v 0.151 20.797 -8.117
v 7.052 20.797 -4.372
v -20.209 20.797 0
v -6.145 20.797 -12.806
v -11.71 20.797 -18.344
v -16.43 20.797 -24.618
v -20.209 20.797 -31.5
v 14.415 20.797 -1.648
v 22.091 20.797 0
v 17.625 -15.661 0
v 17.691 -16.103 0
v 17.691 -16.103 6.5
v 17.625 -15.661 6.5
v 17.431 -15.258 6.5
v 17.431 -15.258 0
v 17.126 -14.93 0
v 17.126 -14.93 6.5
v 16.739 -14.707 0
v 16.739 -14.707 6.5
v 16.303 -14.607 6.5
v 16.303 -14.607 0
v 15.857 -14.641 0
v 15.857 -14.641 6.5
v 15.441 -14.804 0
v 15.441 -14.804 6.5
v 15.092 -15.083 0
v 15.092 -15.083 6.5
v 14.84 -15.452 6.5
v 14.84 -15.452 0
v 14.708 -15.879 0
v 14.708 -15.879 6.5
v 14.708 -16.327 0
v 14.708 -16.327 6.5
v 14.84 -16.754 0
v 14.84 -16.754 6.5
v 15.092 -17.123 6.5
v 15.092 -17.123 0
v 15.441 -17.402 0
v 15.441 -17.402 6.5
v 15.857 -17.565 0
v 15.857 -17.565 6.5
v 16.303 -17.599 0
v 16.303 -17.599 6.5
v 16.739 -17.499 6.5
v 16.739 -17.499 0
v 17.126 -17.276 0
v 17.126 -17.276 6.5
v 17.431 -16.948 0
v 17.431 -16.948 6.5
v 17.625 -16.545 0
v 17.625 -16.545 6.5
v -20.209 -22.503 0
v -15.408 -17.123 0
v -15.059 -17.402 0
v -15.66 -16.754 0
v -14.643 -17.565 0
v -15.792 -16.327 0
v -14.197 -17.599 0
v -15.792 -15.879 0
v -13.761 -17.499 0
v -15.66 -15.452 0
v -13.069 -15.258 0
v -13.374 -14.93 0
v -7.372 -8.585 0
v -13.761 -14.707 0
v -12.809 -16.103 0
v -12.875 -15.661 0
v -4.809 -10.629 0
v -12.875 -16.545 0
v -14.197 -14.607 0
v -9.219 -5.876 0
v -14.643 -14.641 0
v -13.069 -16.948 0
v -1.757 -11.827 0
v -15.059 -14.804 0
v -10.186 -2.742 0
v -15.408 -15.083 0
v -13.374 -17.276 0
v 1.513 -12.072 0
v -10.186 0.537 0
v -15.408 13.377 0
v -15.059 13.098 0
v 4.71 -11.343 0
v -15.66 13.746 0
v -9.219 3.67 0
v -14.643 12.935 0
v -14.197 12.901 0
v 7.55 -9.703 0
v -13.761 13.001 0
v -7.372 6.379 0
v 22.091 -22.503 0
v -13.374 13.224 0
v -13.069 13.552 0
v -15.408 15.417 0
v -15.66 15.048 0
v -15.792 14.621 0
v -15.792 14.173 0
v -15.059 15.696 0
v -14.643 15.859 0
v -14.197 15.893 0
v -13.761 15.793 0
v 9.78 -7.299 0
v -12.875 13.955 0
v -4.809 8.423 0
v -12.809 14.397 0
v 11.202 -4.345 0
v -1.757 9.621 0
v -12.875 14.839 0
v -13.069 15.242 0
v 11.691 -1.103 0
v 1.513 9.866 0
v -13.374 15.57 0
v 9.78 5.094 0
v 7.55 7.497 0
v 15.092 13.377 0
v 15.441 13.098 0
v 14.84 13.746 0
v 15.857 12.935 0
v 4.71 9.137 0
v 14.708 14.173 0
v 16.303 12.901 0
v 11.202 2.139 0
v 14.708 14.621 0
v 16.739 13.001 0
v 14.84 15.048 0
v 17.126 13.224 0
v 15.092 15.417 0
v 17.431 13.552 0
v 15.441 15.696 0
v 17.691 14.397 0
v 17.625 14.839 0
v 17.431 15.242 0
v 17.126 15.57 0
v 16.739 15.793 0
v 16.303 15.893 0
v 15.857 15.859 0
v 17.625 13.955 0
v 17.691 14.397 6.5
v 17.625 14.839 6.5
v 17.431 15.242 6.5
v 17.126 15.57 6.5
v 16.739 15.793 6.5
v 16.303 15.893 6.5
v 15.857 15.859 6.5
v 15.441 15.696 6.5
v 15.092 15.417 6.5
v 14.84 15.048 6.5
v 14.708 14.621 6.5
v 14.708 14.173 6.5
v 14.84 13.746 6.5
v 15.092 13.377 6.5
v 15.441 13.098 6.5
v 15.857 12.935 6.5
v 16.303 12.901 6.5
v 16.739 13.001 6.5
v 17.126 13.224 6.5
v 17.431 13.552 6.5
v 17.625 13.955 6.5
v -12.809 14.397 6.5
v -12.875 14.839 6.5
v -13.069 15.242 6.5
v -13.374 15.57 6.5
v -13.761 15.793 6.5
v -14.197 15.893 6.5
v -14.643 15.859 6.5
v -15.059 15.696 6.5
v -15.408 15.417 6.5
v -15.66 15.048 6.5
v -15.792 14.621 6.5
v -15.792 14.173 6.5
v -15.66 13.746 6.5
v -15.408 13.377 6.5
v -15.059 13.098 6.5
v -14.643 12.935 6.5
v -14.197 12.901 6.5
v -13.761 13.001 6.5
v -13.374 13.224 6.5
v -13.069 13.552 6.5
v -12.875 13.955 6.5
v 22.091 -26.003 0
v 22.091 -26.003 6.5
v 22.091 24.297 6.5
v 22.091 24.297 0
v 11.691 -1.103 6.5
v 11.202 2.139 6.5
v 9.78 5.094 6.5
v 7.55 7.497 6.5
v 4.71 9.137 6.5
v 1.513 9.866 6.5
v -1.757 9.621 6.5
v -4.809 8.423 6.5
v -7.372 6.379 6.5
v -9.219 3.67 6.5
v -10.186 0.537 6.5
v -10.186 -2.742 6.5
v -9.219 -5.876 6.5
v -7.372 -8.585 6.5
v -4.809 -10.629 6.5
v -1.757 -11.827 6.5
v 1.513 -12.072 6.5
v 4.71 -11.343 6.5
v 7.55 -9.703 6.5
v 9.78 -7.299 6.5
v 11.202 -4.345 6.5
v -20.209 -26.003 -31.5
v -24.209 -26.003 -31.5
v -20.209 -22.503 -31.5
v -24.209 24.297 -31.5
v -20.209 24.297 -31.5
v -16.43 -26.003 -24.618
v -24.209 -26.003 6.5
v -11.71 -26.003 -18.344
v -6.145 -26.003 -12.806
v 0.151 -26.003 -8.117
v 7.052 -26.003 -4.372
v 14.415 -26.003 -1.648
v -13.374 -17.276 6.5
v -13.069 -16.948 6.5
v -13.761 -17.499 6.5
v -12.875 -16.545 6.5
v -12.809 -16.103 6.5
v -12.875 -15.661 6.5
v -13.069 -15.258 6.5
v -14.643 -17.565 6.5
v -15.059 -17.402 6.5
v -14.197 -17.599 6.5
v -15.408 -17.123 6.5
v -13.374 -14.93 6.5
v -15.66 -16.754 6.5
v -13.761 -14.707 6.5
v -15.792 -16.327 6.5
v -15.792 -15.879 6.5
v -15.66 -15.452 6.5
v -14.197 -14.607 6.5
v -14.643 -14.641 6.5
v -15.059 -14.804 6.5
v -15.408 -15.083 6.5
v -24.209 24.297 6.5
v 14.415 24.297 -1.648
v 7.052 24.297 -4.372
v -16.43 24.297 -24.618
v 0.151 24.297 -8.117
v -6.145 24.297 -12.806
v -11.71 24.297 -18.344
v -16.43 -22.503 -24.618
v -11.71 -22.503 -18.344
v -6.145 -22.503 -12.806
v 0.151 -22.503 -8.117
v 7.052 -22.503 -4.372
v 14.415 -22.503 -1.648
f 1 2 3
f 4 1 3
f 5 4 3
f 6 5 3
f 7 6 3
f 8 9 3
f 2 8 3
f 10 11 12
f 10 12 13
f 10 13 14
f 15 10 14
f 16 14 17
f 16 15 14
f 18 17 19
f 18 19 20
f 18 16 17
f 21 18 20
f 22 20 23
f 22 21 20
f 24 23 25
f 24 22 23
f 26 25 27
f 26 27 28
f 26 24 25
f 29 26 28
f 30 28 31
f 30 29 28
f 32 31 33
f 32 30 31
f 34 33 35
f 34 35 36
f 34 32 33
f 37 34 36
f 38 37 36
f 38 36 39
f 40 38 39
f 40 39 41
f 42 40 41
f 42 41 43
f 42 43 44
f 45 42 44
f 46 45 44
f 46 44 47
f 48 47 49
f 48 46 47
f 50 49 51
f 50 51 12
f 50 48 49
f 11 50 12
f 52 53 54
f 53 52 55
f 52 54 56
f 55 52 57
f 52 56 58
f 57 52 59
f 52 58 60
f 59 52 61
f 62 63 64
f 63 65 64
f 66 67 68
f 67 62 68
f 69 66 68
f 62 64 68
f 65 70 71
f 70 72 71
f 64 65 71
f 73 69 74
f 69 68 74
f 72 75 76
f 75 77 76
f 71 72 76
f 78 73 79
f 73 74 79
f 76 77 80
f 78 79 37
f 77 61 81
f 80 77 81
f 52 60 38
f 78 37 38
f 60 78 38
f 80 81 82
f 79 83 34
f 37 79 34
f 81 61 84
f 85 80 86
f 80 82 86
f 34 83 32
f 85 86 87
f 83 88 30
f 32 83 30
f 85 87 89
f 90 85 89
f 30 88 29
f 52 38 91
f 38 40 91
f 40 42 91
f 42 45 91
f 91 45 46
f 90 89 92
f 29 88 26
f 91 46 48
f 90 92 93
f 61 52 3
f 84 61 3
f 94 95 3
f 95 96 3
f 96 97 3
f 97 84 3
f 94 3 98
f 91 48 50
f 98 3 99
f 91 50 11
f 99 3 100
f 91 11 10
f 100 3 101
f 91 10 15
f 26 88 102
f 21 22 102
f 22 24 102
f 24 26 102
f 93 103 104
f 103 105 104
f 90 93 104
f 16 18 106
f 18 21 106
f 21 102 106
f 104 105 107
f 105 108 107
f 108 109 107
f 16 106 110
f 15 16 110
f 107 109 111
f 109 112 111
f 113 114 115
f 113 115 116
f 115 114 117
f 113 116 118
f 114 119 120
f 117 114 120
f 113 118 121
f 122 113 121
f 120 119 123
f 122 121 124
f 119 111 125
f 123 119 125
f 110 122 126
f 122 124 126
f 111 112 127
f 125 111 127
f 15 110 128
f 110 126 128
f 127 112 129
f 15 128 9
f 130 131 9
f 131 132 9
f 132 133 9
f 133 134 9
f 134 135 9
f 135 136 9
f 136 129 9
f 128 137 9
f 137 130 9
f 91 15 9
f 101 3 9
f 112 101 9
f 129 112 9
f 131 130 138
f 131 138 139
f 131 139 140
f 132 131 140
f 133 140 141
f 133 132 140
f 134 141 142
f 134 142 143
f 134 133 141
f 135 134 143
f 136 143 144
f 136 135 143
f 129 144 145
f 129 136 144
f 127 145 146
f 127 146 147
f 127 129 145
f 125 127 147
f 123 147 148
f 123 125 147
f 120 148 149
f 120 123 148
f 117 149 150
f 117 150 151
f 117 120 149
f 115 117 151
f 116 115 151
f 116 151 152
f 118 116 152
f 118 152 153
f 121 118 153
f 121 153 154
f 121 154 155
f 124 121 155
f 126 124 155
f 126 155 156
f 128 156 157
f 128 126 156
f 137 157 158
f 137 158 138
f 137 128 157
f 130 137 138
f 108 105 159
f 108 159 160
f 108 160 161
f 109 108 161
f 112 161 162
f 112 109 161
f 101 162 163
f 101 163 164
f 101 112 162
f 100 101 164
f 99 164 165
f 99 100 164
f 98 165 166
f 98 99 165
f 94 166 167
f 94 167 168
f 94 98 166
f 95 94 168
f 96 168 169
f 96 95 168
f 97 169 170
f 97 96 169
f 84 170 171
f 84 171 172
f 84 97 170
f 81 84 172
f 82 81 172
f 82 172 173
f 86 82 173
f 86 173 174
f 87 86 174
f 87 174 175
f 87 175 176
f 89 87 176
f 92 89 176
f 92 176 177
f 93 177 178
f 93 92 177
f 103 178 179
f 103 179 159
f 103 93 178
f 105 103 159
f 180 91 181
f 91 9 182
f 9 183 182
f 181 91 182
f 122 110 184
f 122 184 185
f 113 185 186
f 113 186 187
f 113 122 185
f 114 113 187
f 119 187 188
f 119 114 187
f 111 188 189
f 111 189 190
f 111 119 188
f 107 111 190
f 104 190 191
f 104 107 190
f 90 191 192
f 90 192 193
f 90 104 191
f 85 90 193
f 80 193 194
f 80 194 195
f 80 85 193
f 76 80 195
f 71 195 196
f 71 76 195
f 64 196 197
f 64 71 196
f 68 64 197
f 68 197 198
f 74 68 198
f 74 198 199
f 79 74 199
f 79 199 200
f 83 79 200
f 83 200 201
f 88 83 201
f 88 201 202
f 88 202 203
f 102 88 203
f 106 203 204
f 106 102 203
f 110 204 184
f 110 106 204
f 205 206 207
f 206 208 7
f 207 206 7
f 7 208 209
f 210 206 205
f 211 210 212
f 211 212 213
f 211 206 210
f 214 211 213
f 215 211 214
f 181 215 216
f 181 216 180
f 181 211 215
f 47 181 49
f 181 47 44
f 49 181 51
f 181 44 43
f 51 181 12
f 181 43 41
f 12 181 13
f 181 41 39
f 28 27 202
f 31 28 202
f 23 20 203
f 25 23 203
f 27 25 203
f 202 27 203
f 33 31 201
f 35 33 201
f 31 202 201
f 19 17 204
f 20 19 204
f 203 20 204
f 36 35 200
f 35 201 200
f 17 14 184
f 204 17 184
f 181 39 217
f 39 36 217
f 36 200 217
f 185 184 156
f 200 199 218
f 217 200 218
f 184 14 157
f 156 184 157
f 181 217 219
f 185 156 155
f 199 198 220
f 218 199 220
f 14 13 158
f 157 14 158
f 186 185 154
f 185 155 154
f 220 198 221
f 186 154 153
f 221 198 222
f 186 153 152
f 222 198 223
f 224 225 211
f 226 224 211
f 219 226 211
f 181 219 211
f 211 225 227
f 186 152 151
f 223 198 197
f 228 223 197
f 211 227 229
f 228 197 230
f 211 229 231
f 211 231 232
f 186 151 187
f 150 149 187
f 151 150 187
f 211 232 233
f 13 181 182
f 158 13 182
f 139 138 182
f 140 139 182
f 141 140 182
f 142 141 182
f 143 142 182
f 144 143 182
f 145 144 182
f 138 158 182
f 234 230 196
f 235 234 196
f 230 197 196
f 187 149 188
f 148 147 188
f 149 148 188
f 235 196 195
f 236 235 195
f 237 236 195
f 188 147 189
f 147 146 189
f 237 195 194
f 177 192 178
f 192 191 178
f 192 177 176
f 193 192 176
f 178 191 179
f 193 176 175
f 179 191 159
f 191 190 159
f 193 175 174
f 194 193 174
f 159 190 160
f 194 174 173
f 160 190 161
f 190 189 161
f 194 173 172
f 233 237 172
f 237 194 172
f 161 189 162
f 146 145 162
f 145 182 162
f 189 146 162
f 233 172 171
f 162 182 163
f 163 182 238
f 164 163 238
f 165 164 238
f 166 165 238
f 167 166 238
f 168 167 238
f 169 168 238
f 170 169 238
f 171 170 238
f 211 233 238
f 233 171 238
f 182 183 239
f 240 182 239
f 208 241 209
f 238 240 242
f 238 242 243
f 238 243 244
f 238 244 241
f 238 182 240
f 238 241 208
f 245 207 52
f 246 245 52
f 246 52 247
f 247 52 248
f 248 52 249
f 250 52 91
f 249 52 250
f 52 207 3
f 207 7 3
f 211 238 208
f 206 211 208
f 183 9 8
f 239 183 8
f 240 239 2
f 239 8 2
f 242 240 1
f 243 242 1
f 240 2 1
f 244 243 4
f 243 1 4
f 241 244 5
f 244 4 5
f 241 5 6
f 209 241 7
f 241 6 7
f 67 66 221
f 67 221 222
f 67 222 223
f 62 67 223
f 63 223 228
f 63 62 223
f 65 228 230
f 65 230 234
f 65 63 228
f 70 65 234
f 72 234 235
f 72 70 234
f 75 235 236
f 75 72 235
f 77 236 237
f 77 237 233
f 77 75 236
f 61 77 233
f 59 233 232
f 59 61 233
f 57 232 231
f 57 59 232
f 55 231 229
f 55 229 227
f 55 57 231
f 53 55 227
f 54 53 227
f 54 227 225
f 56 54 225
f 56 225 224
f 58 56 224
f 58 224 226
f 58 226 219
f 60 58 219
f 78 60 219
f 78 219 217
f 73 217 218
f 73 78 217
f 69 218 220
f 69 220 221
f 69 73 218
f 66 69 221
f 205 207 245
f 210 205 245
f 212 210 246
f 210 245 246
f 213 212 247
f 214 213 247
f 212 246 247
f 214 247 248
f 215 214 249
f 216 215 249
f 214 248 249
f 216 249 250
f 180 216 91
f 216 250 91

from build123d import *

# Parameters (mm, degrees)
F0_W     = 42.3
F0_H     = 42.3
F0_R     = 1.5
F0_R_2   = 11
F1_DEPTH = 6.5
F2_W     = 42.3
F2_H     = 38
F3_DEPTH = 4
F6_DEPTH = 4
F7_DEPTH = 4
F8_DEPTH = 0.5
F9_DEPTH = 0.5


with BuildPart() as f1:
    # F0 (on Top) → F1 (new body)
    with BuildSketch(Plane.XY):
        with Locations((0.9411764706, -0.8529411765)):
            Rectangle(F0_W, F0_H)
        with Locations((-14.3088235294, -16.1029411765)):
            Circle(F0_R, mode=Mode.SUBTRACT)
        with Locations((0.6911764706, -1.1029411765)):
            Circle(F0_R_2, mode=Mode.SUBTRACT)
        with Locations((16.1911764706, -16.1029411765)):
            Circle(F0_R, mode=Mode.SUBTRACT)
        with Locations((-14.3088235294, 14.3970588235)):
            Circle(F0_R, mode=Mode.SUBTRACT)
        with Locations((16.1911764706, 14.3970588235)):
            Circle(F0_R, mode=Mode.SUBTRACT)
    extrude(amount=F1_DEPTH)

    # F2 (on face) → F3 (join)
    with BuildSketch(Plane(origin=(-20.2088235294, 0, 0), x_dir=(0, -1, 0), z_dir=(-1, 0, 0))):
        with Locations((0.8529411765, -12.5)):
            Rectangle(F2_W, F2_H)
    extrude(amount=F3_DEPTH)

    # F5 (on face) → F6 (join)
    with BuildSketch(Plane(origin=(0, 20.2970588235, 0), x_dir=(-1, 0, 0), z_dir=(0, 1, 0))):
        with BuildLine():
            ThreePointArc((-22.0911764706, 0), (3.080762749, -10.3491101908), (20.2088235294, -31.5))
            Line((20.2088235294, -31.5), (20.2088235294, 0))
            Line((20.2088235294, 0), (-22.0911764706, 0))
        make_face()
        Polygon((20.2088235294, 0), (20.2088235294, -31.5), (24.2088235294, -31.5), (24.2088235294, 6.5), (-22.0911764706, 6.5), (-22.0911764706, 0), align=None)
    extrude(amount=F6_DEPTH)

    # F4 (on face) → F7 (join)
    with BuildSketch(Plane.XZ.offset(22.0029411765)):
        with BuildLine():
            ThreePointArc((-20.2088235294, -31.5), (-3.080762749, -10.3491101908), (22.0911764706, 0))
            Line((22.0911764706, 0), (-20.2088235294, 0))
            Line((-20.2088235294, 0), (-20.2088235294, -31.5))
        make_face()
        Polygon((-20.2088235294, 0), (22.0911764706, 0), (22.0911764706, 6.5), (-24.2088235294, 6.5), (-24.2088235294, -31.5), (-20.2088235294, -31.5), align=None)
    extrude(amount=F7_DEPTH)

    # F8 (cut): a face of the model
    f8_faces = [f1.faces().sort_by_distance(p)[0] for p in [
        (-9.1642811897, -22.0029411765, -8.7688606087),
    ]]
    extrude(f8_faces, amount=-F8_DEPTH, mode=Mode.SUBTRACT)

    # F9 (cut): a face of the model
    f9_faces = [f1.faces().sort_by_distance(p)[0] for p in [
        (-9.1642811897, 20.2970588235, -8.7688606087),
    ]]
    extrude(f9_faces, amount=-F9_DEPTH, mode=Mode.SUBTRACT)


solid = f1.part
